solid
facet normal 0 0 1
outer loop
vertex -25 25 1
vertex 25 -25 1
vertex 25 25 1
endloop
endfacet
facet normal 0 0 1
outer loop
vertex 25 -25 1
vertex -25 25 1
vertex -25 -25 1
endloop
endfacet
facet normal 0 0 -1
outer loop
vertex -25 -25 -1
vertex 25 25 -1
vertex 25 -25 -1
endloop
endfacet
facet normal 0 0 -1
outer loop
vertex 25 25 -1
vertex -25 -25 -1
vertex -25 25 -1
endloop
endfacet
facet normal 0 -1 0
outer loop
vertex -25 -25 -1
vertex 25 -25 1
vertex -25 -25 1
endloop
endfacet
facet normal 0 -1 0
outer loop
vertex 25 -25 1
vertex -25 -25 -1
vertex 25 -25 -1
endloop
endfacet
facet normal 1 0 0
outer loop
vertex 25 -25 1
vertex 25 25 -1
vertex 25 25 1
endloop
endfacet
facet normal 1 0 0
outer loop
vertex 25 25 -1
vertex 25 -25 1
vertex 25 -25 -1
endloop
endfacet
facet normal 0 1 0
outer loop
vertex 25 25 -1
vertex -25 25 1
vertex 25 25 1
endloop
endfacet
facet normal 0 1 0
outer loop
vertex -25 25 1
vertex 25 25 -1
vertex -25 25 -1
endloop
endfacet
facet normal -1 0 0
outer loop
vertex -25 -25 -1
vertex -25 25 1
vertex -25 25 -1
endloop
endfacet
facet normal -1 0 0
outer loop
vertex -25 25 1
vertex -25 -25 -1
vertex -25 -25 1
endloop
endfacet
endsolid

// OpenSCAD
// Parameters for the flat square plate
plate_size = 50; // Length of one side of the square
plate_thickness = 2; // Thickness of the plate

// Function to create a flat square plate
module flat_square_plate() {
    cube([plate_size, plate_size, plate_thickness], center = true);
}

// Generate the flat square plate
flat_square_plate();
